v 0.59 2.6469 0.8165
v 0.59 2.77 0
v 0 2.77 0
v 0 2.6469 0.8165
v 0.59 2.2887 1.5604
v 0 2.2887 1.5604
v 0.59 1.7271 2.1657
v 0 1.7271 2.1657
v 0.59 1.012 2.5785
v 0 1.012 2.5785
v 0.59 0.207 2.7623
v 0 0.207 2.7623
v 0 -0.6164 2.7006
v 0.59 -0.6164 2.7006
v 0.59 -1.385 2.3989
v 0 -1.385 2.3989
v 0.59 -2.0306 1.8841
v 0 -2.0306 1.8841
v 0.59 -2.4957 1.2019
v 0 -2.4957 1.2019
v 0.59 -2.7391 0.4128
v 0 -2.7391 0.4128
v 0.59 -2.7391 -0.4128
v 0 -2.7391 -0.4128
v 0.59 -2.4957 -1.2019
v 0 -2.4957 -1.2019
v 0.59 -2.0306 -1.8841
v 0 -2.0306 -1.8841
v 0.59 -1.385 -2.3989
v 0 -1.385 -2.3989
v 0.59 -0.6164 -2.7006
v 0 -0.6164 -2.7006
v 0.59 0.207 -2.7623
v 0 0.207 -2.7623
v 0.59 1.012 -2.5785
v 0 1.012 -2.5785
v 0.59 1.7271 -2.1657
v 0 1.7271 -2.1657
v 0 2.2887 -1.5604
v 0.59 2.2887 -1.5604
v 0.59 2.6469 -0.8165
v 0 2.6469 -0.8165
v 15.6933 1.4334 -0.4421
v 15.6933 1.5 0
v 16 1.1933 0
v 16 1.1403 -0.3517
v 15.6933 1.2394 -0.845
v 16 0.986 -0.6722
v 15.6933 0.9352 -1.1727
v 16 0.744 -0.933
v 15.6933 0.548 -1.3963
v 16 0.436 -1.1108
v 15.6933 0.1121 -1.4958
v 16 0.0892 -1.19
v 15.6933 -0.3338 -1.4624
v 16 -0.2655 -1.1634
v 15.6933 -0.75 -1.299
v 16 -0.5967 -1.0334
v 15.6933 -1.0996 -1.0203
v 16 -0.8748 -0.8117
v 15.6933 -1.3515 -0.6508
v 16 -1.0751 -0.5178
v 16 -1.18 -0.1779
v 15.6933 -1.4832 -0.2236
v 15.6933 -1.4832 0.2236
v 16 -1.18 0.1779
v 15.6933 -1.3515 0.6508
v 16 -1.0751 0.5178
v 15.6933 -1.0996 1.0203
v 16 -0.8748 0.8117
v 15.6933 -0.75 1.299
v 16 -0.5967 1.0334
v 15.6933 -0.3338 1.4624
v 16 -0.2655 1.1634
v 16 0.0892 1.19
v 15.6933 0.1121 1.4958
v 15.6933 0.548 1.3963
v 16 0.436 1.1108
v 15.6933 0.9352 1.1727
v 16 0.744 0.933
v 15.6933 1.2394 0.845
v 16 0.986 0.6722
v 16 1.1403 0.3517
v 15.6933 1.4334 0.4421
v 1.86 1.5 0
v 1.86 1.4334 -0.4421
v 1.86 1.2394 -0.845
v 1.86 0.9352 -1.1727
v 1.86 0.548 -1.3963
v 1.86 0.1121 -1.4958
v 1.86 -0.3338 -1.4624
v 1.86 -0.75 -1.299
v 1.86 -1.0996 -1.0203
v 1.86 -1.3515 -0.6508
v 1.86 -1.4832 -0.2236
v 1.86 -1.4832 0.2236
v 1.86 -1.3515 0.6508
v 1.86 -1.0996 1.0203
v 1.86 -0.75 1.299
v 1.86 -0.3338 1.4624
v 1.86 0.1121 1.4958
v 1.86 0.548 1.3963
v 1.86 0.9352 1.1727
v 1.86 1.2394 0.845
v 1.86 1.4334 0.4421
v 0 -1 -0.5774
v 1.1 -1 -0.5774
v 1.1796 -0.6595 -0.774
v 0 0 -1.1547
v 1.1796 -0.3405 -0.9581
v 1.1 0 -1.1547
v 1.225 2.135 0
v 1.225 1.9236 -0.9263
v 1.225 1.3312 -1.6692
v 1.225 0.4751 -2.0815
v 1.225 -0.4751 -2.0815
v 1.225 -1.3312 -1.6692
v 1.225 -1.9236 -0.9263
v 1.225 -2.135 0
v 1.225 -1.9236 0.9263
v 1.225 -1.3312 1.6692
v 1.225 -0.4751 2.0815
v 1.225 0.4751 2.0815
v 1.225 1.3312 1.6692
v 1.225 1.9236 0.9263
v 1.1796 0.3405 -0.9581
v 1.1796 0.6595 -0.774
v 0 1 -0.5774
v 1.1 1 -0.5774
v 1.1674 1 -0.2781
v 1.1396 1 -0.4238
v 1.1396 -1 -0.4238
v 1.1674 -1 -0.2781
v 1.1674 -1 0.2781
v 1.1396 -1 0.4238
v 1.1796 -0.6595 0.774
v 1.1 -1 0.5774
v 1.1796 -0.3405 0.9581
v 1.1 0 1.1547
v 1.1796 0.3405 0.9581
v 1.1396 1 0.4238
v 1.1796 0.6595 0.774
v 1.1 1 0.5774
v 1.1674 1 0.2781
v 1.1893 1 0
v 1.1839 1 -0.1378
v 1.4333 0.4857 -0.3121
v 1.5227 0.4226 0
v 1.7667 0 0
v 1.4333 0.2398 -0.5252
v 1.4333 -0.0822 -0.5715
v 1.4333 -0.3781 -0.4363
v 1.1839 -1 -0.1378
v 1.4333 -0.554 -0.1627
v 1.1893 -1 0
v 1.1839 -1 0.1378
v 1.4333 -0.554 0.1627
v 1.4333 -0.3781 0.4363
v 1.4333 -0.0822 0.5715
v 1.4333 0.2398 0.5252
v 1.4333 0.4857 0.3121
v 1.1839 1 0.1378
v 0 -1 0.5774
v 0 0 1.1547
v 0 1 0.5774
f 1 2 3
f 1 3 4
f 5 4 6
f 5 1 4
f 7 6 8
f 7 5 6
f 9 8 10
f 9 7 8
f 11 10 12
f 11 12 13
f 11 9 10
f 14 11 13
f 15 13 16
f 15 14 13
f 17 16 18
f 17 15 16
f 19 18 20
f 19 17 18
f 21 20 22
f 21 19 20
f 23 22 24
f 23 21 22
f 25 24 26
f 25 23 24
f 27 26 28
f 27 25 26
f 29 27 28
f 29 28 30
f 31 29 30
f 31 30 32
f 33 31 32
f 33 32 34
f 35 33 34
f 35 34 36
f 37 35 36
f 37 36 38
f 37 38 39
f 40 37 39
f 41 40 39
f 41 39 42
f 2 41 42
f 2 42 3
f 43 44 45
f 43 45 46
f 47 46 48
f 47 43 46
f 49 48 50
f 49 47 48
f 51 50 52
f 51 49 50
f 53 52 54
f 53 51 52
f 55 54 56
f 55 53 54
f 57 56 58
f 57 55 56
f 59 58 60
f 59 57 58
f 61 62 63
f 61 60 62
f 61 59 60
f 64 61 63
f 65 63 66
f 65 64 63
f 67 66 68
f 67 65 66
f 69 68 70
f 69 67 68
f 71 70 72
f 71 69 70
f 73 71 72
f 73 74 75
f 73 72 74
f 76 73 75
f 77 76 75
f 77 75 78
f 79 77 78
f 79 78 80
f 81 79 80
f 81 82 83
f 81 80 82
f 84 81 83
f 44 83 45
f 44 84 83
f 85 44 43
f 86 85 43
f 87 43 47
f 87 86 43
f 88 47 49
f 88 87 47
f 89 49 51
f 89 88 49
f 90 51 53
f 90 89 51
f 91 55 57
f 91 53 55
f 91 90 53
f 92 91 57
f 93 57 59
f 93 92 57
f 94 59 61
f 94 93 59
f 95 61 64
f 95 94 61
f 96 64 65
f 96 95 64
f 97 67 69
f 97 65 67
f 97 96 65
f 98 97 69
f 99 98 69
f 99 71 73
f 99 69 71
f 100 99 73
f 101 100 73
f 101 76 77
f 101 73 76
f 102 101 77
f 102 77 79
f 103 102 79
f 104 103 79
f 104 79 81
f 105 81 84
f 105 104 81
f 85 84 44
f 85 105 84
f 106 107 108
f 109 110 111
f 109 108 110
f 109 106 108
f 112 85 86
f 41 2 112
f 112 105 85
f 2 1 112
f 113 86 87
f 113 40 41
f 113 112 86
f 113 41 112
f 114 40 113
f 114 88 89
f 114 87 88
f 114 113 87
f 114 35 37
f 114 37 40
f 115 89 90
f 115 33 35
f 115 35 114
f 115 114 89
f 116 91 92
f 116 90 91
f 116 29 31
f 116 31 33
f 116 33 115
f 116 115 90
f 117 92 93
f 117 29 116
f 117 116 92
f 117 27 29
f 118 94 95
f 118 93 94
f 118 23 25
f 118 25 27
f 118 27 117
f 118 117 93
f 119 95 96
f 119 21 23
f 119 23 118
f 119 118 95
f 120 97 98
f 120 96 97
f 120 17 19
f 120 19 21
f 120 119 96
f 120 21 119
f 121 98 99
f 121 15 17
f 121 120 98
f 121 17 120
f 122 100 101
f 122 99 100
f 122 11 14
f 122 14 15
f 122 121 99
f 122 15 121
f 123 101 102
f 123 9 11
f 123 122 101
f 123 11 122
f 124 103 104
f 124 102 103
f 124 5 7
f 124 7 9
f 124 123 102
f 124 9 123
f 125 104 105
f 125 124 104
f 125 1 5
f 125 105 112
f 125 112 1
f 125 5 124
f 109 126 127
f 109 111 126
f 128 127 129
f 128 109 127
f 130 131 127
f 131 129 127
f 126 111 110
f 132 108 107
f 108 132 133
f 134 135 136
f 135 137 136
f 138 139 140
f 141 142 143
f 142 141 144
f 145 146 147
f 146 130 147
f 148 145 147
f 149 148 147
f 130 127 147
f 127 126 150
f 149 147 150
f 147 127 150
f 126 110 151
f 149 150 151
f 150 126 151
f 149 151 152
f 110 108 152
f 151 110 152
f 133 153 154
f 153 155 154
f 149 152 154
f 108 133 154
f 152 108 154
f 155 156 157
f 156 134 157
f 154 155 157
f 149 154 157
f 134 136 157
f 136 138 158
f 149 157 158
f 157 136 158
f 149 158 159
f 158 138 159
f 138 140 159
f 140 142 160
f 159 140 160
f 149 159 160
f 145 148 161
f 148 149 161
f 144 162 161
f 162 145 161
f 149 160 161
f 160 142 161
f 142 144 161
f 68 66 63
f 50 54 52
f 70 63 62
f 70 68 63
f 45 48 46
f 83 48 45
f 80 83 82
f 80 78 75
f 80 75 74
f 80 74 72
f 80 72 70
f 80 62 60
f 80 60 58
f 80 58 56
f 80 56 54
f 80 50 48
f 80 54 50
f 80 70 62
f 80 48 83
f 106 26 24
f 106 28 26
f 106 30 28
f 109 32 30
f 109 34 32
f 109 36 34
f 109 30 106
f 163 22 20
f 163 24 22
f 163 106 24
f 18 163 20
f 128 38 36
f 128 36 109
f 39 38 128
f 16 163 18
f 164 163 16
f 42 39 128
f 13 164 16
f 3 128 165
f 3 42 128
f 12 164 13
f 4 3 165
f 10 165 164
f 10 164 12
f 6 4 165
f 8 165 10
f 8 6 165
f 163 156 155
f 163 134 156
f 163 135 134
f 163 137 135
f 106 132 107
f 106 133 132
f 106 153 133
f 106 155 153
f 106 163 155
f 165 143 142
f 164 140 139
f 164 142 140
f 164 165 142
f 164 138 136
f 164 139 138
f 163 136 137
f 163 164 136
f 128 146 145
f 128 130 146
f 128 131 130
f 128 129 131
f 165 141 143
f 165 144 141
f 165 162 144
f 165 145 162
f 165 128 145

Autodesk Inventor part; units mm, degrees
ref_plane "YZ Plane" through (0, 0, 0) normal (1, 0, 0) x (0, 1, 0)
ref_plane "XZ Plane" through (0, 0, 0) normal (0, 1, 0) x (-1, 0, 0)
sketch "Sketch1" plane through (0, 0, 0) normal (0, 0, 1) x (1, 0, 0)
  line L0 (16, 0) -> (16, 1.5)
  line L1 (16, 1.5) -> (3.36, 1.5)
  line L2 (3.36, 1.5) -> (3.0533, 1.5)
  line L3 (0, 2.77) -> (0, 1.1547)
  line L4 (0, 1.1547) -> (1.1, 1.1547)
  line L5 (1.1, 1.1547) -> (1.7667, 0)
  line L6 (1.7667, 0) -> (16, 0)
  line L7 (0, 2.77) -> (0.59, 2.77)
  line L8 (0.59, 2.77) -> (1.86, 1.5)
  line L9 (3.0533, 1.5) -> (1.86, 1.5)
  line L10 (3.36, 1.5) -> (1.86, 1.5) construction
  line L11 (1.86, 1.5) -> (1.86, 1.5)
  line L12 (-25.4, 0) -> (152.4, 0) projected
  line L13 (0, -2.1133) -> (0, 12.6797) projected
  dimension "d0" = 16
  dimension "d1" = 12.64
  dimension "d2" = 1.1
  dimension "d3" = 3
  dimension "d6" = 1.86
  dimension "d7" = 45
  dimension "d8" = 2.3094
  dimension "d9" = 60
  dimension "d10" = 5.54
  dimension "d11" = 3
  dimension "d12" = 0.3067
revolve "Body" add sketch "Sketch1" angle 360 about axis through (1.7667, 0, 0) along (1, 0, 0) contours L6 L5 L4 L3 L7 L8 L9 L2 L1 L0
sketch "Sketch2" plane through (0, 0, 0) normal (-1, 0, 0) x (0, 0, 1)
  circle A0 centre (0, 0) radius 1.1547 projected
  line L0 (0, -6.4055) -> (0, 6.4055) projected
  line L1 (-6.4055, 0) -> (6.4055, 0) projected
  line L2 (1.1547, 0) -> (0.5774, -1)
  line L3 (0.5774, -1) -> (-0.5774, -1)
  line L4 (-0.5774, -1) -> (-1.1547, 0)
  line L5 (-1.1547, 0) -> (-0.5774, 1)
  line L6 (-0.5774, 1) -> (0.5774, 1)
  line L7 (0.5774, 1) -> (1.1547, 0)
  point P0 (0, 1.1547)
extrude "Slot" add sketch "Sketch2" against normal up to next contours L7 A0 | A0 L2 | L6 L0 A0 | A0 L0 L3 | L0 L6 A0 | A0 L3 L0 | L4 A0 | A0 L5
thread "Thread" size "M14x2" class "6g" standard "ISO Metric profile" length 12.64
chamfer "Chamfer1" distance 0.3067 distance2 0.3067 1 edges at (16, -1.5, 0) measured on face at (16, -0.3743, -0.3316)
ref_plane "Work Plane1" through (104.775, 0, 0) normal (0, 0, -1) x (1, 0, 0)
equation "\"d15\" = GEL"
equation "\"d17\" = -0.5 * SPD + 0.5 * GD"
equation "\"d18\" = GUL"
equation "\"d0\" = NLG"
equation "\"d1\" = GEL"
equation "\"d2\" = INTI"
equation "\"d3\" = GD"
equation "\"d6\" = KOH"
equation "\"d7\" = 0.5 * SEWI"
equation "\"d8\" = 1.1547 * SW"
equation "\"d10\" = KOD"
equation "\"d11\" = BDM"
equation "\"d12\" = GAL"
equation "\"NLG\" = 16"
equation "\"INTI\" = 1.1"
equation "\"GEL\" = 12.64"
equation "\"GAL\" = 0.61345 * PTC"
equation "\"KOH\" = 1.86"
equation "\"KOD\" = 5.54"
equation "\"GUL\" = 0.61345 * PTC"
equation "\"SPD\" = NND - 1.2269 * PTC"
equation "\"BDM\" = NND"
equation "\"GD\" = NND"
equation "\"SEWI\" = 90deg"
equation "\"SW\" = 2"
equation "\"TOA\" = 30deg"
equation "\"GD1\" = THREADDIA - 1.2269 * PTC"
equation "\"EPV\" = 3.36"
equation "\"THREADDIA\" = 3"
equation "\"PTC\" = 0.5"
equation "\"NND\" = 3"
equation "\"E0\" = 2.31"
properties part number "ISO 10642  - M3  x  16" material "Steel"
